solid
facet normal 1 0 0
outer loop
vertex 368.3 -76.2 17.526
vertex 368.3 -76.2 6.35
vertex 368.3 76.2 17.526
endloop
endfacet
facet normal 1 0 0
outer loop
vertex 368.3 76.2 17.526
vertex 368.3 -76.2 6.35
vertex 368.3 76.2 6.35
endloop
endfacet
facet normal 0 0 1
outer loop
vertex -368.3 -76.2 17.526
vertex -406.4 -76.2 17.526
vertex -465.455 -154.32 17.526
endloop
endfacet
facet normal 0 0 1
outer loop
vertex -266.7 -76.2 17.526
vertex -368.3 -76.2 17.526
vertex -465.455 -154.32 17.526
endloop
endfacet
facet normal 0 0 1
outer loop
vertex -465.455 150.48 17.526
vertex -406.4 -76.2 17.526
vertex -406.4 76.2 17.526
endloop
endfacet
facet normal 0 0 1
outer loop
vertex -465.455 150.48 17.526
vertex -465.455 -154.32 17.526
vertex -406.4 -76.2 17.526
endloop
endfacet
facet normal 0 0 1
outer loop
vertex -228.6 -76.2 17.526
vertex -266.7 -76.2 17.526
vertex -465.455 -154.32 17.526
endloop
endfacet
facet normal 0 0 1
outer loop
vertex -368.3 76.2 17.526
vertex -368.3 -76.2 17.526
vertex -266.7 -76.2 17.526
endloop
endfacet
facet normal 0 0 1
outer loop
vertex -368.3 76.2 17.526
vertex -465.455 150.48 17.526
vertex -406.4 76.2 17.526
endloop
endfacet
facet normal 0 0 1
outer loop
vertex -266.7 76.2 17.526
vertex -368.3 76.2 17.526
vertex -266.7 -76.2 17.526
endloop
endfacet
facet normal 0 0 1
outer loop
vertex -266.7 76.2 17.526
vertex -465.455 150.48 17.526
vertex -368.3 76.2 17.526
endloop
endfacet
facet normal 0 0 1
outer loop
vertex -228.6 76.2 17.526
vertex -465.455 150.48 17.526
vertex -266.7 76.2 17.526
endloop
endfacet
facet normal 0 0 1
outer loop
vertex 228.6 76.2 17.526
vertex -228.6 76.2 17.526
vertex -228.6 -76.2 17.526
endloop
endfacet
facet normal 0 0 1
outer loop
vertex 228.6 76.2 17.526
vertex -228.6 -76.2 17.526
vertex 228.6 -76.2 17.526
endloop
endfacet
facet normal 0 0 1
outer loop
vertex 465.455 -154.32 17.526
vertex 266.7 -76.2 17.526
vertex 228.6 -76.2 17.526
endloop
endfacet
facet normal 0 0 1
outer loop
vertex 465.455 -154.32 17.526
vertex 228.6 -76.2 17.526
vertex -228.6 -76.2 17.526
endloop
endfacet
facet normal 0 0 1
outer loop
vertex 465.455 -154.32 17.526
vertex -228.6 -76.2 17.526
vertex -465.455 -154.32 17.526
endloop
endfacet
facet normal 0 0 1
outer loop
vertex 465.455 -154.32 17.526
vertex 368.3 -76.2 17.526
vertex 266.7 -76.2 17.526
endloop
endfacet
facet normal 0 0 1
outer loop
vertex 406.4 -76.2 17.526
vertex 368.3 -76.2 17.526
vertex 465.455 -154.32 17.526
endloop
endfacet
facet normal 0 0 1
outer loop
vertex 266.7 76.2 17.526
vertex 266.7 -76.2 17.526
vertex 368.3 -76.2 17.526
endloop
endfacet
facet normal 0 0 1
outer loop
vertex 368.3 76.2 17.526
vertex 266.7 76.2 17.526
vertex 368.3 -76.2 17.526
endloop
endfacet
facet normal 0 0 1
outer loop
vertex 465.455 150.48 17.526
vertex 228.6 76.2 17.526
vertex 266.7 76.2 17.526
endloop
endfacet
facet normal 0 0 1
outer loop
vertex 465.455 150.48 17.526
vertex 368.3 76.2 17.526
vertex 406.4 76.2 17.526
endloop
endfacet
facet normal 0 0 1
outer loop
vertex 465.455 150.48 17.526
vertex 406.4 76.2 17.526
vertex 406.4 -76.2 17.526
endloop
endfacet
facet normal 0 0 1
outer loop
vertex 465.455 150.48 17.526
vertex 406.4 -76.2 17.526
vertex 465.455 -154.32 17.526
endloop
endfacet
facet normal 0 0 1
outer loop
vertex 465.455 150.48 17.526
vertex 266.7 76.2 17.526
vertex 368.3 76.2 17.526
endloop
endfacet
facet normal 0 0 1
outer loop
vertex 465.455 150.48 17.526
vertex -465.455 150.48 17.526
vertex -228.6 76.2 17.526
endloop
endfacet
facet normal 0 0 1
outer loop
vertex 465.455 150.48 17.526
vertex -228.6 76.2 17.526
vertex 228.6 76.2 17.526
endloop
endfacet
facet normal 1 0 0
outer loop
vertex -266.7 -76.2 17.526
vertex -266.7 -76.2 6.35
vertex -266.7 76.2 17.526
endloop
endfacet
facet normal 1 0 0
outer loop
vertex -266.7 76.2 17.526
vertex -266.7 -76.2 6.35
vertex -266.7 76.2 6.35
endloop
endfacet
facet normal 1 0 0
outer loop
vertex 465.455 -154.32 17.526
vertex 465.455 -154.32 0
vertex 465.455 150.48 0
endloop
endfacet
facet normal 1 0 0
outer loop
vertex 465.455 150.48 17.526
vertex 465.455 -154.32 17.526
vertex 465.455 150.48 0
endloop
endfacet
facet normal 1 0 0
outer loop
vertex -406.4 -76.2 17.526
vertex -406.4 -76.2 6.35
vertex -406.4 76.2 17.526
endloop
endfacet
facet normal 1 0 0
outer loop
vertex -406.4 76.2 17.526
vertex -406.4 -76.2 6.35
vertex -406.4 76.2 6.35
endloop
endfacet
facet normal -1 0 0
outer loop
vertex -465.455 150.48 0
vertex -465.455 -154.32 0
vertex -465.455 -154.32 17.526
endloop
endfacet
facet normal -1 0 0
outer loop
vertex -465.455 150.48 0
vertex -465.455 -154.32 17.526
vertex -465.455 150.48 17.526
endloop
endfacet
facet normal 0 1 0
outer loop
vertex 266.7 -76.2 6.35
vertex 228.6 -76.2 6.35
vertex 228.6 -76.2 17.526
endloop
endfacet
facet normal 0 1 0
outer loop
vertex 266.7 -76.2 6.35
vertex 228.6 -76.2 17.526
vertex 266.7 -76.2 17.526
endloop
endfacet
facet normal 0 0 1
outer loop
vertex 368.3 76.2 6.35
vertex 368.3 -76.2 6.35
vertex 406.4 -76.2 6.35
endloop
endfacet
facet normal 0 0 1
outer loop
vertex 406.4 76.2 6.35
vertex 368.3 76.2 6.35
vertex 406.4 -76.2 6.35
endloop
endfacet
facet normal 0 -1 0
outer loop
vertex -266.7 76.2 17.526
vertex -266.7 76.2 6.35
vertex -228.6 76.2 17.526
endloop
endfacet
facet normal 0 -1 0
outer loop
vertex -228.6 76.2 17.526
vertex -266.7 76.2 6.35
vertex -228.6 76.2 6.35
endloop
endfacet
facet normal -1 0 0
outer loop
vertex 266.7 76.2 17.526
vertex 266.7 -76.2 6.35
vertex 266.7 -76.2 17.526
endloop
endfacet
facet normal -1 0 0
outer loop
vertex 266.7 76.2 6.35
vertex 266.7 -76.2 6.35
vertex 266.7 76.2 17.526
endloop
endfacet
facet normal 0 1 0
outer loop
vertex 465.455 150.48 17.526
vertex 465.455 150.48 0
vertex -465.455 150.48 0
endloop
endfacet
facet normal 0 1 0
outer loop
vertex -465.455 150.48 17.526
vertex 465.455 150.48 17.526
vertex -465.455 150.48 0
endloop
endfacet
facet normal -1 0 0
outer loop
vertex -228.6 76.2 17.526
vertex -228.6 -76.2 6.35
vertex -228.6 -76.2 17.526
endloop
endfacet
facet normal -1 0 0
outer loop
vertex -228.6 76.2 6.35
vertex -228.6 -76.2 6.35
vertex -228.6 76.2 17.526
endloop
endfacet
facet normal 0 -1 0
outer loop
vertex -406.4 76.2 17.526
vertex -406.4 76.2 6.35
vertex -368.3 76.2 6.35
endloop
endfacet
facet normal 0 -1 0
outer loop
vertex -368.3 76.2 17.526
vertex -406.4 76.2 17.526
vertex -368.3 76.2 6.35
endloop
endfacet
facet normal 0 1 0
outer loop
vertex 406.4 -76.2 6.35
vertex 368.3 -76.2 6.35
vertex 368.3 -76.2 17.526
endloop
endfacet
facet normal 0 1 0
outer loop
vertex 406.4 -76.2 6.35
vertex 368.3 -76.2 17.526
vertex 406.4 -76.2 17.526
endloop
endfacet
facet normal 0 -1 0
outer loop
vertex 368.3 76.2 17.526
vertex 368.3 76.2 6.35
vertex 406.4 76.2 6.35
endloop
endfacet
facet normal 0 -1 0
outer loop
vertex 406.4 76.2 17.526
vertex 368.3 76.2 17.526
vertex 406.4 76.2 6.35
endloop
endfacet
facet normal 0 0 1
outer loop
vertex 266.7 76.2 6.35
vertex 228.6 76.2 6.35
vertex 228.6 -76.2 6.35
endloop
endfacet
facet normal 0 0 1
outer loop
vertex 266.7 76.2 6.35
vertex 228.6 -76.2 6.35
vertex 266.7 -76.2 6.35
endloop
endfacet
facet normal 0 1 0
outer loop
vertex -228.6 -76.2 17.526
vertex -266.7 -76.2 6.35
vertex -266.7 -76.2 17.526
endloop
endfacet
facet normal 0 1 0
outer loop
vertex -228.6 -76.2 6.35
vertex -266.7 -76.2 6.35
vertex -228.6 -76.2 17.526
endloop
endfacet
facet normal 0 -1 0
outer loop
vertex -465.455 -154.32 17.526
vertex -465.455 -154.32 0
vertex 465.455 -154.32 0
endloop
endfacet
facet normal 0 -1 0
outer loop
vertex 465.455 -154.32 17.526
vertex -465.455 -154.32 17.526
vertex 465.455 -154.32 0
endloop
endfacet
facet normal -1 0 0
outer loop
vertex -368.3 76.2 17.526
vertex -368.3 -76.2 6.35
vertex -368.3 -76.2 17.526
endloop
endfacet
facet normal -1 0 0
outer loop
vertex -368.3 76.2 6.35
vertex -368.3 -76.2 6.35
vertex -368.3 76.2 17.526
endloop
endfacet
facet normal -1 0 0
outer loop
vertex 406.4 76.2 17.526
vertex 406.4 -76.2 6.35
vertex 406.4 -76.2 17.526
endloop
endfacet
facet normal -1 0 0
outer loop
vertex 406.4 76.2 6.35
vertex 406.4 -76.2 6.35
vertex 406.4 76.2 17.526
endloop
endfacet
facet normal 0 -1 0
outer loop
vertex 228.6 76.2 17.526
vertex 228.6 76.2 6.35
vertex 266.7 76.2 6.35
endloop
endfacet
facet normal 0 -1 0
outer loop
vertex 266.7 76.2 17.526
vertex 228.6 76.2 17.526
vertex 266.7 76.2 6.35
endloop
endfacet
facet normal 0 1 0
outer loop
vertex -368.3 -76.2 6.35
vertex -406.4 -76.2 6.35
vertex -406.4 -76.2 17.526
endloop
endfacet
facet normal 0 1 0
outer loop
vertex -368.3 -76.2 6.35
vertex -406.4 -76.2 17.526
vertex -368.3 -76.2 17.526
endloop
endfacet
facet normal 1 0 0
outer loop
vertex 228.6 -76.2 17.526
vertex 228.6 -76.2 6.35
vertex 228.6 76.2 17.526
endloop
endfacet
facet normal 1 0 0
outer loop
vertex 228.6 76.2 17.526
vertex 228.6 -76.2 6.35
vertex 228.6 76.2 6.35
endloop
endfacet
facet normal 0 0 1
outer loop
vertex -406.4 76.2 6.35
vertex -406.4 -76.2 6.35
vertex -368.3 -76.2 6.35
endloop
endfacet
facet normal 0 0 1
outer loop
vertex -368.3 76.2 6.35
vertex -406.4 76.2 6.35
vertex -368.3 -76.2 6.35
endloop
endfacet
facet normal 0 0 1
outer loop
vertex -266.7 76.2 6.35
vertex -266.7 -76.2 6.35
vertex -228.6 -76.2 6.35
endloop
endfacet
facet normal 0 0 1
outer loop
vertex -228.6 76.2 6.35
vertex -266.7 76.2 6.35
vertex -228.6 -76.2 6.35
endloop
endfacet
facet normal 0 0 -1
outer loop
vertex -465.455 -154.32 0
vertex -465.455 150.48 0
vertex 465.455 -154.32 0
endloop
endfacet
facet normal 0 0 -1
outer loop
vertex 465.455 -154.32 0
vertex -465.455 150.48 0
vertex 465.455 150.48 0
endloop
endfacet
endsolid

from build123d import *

# Parameters (mm, degrees)
F0_W     = 914.4
F0_H     = 304.8
F0_W_2   = 38.1
F0_H_2   = 152.4
F0_W_3   = 8.255
F1_DEPTH = 17.526
F2_DEPTH = 6.35


with BuildPart() as f1:
    # F0 (on Top) → F1 (new body)
    with BuildSketch(Plane.XY):
        with Locations((0, -1.919626)):
            Rectangle(F0_W, F0_H)
        with Locations((-387.35, 0)):
            Rectangle(F0_W_2, F0_H_2, mode=Mode.SUBTRACT)
        with Locations((-247.65, 0)):
            Rectangle(F0_W_2, F0_H_2, mode=Mode.SUBTRACT)
        with Locations((247.65, 0)):
            Rectangle(F0_W_2, F0_H_2, mode=Mode.SUBTRACT)
        with Locations((387.35, 0)):
            Rectangle(F0_W_2, F0_H_2, mode=Mode.SUBTRACT)
        with Locations((-461.3275, -1.919626)):
            Rectangle(F0_W_3, F0_H)
        with Locations((461.3275, -1.919626)):
            Rectangle(F0_W_3, F0_H)
    extrude(amount=F1_DEPTH)

    # F0 (on Top) → F2 (join)
    with BuildSketch(Plane.XY):
        with Locations((-387.35, 0)):
            Rectangle(F0_W_2, F0_H_2)
        with Locations((-247.65, 0)):
            Rectangle(F0_W_2, F0_H_2)
        with Locations((247.65, 0)):
            Rectangle(F0_W_2, F0_H_2)
        with Locations((387.35, 0)):
            Rectangle(F0_W_2, F0_H_2)
    extrude(amount=F2_DEPTH)


solid = f1.part
